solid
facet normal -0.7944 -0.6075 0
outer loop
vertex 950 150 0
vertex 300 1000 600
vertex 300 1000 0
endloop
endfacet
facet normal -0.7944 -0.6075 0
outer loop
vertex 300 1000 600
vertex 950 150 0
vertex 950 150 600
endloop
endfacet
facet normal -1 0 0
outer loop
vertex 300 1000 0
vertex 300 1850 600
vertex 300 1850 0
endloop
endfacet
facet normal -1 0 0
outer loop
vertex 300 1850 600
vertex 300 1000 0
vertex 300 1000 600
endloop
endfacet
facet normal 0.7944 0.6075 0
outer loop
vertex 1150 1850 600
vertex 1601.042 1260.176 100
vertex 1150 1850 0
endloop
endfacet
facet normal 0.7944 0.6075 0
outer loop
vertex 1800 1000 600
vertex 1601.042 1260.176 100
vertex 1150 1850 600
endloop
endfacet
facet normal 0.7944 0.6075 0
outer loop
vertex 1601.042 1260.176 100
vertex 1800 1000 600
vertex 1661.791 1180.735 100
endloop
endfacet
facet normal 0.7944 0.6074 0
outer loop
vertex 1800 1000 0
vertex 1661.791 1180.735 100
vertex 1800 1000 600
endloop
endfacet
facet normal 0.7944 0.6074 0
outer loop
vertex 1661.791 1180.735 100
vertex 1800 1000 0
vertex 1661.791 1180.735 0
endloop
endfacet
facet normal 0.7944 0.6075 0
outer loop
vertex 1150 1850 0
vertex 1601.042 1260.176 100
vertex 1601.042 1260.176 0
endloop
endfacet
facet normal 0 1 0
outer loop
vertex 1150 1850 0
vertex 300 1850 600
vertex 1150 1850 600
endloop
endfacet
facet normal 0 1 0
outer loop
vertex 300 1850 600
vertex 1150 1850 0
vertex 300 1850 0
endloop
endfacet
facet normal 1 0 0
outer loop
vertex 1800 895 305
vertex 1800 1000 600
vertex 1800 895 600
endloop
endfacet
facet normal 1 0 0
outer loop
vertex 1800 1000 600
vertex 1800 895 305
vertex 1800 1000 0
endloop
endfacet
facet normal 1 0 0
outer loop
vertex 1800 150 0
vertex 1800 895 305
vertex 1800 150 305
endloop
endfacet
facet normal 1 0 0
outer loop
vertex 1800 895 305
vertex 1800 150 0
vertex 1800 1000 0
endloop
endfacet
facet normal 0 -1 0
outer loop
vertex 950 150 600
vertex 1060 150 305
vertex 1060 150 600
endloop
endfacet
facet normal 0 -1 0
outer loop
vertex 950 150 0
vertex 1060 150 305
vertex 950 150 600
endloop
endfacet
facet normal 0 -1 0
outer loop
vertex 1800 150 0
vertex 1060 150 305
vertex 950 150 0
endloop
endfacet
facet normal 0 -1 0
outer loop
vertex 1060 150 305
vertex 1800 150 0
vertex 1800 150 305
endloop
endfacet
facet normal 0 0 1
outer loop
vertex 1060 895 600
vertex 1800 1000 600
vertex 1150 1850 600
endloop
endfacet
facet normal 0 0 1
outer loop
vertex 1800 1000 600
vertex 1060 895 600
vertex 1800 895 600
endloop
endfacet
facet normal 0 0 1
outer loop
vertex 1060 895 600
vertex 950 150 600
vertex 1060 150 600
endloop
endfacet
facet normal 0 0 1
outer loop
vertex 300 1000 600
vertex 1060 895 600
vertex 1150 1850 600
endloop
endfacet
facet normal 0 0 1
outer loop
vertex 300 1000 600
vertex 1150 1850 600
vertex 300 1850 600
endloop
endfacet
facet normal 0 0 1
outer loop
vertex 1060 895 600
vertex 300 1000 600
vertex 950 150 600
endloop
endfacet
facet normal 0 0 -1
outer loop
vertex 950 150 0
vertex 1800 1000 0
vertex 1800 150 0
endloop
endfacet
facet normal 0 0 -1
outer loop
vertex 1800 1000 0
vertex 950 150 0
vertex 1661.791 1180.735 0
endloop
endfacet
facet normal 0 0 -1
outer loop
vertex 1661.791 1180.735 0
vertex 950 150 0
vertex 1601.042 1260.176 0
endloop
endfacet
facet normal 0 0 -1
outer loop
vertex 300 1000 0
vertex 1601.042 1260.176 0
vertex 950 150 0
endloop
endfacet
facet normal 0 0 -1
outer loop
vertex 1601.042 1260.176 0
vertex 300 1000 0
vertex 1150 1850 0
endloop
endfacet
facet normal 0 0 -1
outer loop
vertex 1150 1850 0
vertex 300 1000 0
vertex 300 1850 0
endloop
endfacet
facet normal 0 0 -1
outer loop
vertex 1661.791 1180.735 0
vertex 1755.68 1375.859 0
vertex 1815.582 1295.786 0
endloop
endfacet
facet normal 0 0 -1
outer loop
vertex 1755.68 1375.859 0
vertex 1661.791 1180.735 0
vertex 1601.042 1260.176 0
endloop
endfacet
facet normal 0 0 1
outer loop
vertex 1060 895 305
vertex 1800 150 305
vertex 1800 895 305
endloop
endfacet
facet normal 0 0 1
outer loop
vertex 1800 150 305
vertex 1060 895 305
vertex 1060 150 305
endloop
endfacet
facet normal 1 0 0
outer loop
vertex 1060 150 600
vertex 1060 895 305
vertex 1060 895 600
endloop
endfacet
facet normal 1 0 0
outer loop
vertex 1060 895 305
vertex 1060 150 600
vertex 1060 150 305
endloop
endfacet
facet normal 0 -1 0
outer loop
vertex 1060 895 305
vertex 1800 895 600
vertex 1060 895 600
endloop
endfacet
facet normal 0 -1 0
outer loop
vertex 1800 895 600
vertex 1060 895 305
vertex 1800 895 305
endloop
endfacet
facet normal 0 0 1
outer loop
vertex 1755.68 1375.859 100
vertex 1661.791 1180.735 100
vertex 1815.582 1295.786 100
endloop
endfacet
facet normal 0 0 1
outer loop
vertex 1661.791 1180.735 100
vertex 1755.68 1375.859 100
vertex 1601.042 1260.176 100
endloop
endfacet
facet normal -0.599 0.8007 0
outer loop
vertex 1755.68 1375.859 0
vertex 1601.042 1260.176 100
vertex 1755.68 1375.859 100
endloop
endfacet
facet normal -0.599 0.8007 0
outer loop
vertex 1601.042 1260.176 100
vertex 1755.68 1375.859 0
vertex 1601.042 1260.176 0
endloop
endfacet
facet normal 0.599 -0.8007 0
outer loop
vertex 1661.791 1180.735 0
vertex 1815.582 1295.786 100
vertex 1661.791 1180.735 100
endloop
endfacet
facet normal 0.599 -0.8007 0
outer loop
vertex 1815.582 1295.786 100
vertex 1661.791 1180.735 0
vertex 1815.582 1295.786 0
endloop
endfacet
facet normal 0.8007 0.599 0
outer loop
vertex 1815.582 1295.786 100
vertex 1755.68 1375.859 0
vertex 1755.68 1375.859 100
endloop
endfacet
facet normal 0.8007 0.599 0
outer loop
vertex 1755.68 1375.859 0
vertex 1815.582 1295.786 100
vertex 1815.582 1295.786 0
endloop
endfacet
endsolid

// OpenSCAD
a = 500 * [[0,0],[0,5.2],[1.5,5.4],[6.5,-1.2]];

%polygon(a);

module topfloor() {
    
    color("gray") translate([0,0,300]) cube([850, 1300, 300]);
}

module firstfloor() {
    
    color("gray") translate([0,0,000]) cube([850, 2000, 300]);
}

module alt1() {

rotate([0,0,36.8]) { 
    
    translate([1120,-200,0]) topfloor();
    translate([1120,-900,0]) firstfloor();
    
    translate([1980,-50,0]) cube([250,100,100]);
}
}

module alt2() {

rotate([0,0,0]) { 
    
    translate([300,1000,000]) color("gray") cube([850, 850, 300]);

    translate([950,150,000]) color("lightgray") cube([850, 850, 300]);

    translate([300,1000,300]) color("gray") cube([850, 850, 300]);

    translate([950,580,300]) color("lightgray") cube([850, 425, 300]);

rotate([0,0,36.8]) { 
    translate([1980,-50,0]) cube([250,100,100]);
}
}
}


module alt3() {

rotate([0,0,0]) { 

color("gray") difference() {    
     hull() {
    translate([300,1000,000]) cube([850, 850, 300]);

    translate([950,150,000]) cube([850, 850, 300]);

    translate([300,1000,300]) color("gray") cube([850, 850, 300]);

    translate([950,150,300]) cube([850, 850, 300]);
}

    translate([1060,145,305]) cube([750, 750, 300]);

}


rotate([0,0,36.8]) { 
    translate([1980,-50,0]) cube([250,100,100]);
}
}
}

module original() {
    rotate([0,0,-10]) { translate([250,700,000]) color("gray") cube([1300, 500, 300]);
    }
}

alt3();
